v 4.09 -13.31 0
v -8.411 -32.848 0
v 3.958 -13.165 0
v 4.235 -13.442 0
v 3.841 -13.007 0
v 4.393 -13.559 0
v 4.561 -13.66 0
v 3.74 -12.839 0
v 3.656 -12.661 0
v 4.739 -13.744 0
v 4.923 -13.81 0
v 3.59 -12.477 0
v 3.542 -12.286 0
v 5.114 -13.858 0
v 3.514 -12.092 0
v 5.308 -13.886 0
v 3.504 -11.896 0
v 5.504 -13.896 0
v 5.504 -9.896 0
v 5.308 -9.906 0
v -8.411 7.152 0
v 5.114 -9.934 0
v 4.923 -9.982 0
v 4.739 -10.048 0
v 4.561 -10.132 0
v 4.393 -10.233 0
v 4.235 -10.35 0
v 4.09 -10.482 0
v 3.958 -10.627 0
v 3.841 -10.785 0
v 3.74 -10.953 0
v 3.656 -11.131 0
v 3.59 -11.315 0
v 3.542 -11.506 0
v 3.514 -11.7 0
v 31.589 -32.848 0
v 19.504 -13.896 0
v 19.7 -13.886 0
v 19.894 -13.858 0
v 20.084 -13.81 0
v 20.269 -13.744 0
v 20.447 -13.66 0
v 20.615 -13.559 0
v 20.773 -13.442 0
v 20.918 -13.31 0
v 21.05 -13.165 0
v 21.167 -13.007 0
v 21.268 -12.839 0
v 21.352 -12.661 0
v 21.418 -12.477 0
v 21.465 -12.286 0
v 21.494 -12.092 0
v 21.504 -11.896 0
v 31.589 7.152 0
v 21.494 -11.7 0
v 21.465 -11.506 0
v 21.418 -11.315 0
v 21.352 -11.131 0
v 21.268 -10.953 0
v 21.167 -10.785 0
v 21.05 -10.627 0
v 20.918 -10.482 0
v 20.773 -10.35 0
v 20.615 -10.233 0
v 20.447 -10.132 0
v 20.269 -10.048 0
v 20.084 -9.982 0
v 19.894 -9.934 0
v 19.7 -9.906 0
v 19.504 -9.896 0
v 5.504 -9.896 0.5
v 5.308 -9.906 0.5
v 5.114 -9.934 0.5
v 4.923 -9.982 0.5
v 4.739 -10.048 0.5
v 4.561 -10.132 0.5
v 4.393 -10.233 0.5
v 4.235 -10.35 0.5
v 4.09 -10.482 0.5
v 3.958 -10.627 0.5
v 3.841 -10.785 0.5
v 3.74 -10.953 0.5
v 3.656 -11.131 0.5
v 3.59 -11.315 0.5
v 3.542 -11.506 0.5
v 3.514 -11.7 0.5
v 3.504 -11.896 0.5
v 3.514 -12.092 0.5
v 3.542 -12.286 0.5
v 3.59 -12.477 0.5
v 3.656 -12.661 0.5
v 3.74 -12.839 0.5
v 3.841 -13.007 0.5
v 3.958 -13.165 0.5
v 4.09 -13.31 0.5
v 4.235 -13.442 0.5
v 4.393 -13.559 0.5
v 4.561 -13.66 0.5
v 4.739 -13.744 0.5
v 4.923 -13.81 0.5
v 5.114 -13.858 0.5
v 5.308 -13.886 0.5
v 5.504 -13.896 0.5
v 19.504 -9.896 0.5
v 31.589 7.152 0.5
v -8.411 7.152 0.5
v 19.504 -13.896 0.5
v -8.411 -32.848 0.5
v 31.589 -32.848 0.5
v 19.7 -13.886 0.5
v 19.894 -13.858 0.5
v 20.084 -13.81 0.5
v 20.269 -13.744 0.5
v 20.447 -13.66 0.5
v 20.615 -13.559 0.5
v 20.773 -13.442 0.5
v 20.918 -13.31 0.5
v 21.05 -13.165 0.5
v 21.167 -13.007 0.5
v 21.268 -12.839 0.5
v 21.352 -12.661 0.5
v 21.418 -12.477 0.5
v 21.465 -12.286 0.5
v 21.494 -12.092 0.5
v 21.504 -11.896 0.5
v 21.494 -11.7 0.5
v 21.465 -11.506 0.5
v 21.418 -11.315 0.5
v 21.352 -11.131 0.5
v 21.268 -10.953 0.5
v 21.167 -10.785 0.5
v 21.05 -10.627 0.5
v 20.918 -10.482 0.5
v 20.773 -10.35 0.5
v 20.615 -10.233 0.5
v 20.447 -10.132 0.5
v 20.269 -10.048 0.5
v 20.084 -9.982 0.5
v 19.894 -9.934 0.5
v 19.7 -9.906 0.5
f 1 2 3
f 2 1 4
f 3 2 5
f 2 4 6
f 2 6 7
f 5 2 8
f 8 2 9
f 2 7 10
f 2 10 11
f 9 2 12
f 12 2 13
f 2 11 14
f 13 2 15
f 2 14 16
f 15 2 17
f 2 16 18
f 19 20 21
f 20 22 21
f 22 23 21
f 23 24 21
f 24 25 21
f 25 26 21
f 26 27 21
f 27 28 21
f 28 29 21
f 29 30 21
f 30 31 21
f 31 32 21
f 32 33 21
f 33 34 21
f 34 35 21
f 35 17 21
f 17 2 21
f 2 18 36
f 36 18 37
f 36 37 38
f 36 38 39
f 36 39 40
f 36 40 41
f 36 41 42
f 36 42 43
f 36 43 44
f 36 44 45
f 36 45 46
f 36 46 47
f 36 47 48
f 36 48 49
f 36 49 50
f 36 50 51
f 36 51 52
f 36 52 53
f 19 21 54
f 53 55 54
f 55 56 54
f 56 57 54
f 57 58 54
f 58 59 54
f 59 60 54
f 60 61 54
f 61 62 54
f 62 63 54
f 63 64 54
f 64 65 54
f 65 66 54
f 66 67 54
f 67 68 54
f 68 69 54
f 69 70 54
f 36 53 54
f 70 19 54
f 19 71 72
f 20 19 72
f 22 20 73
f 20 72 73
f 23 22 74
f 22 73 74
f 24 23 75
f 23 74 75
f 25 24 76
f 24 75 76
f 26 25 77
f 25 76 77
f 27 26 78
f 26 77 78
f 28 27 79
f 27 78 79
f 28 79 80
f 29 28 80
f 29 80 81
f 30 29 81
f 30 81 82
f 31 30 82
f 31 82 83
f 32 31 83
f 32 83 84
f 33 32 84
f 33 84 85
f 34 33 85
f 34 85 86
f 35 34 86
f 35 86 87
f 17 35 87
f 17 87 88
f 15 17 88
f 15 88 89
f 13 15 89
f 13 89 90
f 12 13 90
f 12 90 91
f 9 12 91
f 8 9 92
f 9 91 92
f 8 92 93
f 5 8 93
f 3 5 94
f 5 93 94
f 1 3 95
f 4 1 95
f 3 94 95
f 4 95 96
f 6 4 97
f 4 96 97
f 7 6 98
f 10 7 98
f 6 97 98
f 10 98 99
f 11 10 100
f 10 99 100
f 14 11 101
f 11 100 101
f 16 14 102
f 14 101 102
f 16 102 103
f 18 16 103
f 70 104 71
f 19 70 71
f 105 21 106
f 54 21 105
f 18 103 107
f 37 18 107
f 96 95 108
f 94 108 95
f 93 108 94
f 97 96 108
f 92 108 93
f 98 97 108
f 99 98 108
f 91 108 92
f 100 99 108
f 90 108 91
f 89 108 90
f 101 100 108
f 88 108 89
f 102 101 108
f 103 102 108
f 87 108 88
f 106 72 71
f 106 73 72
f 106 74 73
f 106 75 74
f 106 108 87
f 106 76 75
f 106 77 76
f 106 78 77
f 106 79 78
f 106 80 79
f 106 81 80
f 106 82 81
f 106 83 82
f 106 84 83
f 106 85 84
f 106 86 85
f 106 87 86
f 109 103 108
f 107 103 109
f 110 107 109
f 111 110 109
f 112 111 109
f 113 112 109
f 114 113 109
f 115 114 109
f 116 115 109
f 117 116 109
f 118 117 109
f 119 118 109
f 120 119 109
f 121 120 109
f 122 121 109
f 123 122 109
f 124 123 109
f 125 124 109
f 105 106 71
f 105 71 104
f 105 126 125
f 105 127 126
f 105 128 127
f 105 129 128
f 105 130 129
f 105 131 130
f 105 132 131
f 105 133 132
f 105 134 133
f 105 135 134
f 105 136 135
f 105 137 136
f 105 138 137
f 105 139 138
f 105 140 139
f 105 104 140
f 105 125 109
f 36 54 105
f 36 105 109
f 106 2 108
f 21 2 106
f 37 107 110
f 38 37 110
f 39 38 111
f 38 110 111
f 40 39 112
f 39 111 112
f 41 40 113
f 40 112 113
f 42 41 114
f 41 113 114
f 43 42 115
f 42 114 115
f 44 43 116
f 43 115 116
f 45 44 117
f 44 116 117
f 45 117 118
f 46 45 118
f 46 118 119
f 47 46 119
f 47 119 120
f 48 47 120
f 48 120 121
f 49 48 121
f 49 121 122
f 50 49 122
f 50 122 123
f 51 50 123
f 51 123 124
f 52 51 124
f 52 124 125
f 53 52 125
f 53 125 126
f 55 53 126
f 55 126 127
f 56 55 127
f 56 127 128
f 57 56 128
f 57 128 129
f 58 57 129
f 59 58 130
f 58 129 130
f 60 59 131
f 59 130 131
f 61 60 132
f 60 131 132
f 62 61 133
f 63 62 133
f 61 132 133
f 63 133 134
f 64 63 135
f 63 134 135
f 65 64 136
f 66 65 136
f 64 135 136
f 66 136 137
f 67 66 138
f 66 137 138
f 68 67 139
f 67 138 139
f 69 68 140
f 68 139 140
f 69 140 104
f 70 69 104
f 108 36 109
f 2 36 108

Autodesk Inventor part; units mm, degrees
ref_plane "YZ Plane" through (0, 0, 0) normal (1, 0, 0) x (0, 1, 0)
ref_plane "XZ Plane" through (0, 0, 0) normal (0, 1, 0) x (-1, 0, 0)
ref_plane "XY Plane" through (0, 0, 0) normal (0, 0, 1) x (1, 0, 0)
sketch "Sketch1" plane through (0, 0, 0) normal (0, 0, 1) x (1, 0, 0)
  line L0 (-8.4106, 7.1523) -> (31.5894, 7.1523)
  line L1 (31.5894, 7.1523) -> (31.5894, -32.8477)
  line L2 (31.5894, -32.8477) -> (-8.4106, -32.8477)
  line L3 (-8.4106, -32.8477) -> (-8.4106, 7.1523)
  point P0 (0, 0)
  dimension "d0" = 40
  dimension "d1" = 40
extrude "Plate1" add sketch "Sketch1" along normal blind 0.5
sketch "Sketch2" plane through (0, 0, 0.5) normal (0, 0, 1) x (1, 0, 0)
  line L0 (19.5039, -11.896) -> (5.5039, -11.896) construction
  line L1 (19.5039, -9.896) -> (5.5039, -9.896)
  line L2 (5.5039, -13.896) -> (19.5039, -13.896)
  arc A0 (19.5039, -13.896) -> (19.5039, -9.896) centre (19.5039, -11.896) ccw
  arc A1 (5.5039, -9.896) -> (5.5039, -13.896) centre (5.5039, -11.896) ccw
  point P0 (0, 0)
  point P1 (12.5039, -11.896)
  dimension "LG_C" = 14
  dimension "LT_C" = 4
extrude "Cut1" cut sketch "Sketch2" against normal blind 0.5
equation "\"d5\" = Thickness"
equation "\"d2\" = Thickness"
equation "\"BendRadius\" = Thickness"
equation "\"BendReliefWidth\" = Thickness"
equation "\"BendReliefDepth\" = 0.5 * Thickness"
equation "\"CornerReliefSize\" = 4 * Thickness"
equation "\"MinimumRemnant\" = 2 * Thickness"
equation "\"TransitionRadius\" = BendRadius"
equation "\"JacobiRadiusSize\" = BendRadius"
equation "\"GapSize\" = Thickness"
equation "\"Thickness\" = 0.5"
properties part number "DecupajOvalizat1"
